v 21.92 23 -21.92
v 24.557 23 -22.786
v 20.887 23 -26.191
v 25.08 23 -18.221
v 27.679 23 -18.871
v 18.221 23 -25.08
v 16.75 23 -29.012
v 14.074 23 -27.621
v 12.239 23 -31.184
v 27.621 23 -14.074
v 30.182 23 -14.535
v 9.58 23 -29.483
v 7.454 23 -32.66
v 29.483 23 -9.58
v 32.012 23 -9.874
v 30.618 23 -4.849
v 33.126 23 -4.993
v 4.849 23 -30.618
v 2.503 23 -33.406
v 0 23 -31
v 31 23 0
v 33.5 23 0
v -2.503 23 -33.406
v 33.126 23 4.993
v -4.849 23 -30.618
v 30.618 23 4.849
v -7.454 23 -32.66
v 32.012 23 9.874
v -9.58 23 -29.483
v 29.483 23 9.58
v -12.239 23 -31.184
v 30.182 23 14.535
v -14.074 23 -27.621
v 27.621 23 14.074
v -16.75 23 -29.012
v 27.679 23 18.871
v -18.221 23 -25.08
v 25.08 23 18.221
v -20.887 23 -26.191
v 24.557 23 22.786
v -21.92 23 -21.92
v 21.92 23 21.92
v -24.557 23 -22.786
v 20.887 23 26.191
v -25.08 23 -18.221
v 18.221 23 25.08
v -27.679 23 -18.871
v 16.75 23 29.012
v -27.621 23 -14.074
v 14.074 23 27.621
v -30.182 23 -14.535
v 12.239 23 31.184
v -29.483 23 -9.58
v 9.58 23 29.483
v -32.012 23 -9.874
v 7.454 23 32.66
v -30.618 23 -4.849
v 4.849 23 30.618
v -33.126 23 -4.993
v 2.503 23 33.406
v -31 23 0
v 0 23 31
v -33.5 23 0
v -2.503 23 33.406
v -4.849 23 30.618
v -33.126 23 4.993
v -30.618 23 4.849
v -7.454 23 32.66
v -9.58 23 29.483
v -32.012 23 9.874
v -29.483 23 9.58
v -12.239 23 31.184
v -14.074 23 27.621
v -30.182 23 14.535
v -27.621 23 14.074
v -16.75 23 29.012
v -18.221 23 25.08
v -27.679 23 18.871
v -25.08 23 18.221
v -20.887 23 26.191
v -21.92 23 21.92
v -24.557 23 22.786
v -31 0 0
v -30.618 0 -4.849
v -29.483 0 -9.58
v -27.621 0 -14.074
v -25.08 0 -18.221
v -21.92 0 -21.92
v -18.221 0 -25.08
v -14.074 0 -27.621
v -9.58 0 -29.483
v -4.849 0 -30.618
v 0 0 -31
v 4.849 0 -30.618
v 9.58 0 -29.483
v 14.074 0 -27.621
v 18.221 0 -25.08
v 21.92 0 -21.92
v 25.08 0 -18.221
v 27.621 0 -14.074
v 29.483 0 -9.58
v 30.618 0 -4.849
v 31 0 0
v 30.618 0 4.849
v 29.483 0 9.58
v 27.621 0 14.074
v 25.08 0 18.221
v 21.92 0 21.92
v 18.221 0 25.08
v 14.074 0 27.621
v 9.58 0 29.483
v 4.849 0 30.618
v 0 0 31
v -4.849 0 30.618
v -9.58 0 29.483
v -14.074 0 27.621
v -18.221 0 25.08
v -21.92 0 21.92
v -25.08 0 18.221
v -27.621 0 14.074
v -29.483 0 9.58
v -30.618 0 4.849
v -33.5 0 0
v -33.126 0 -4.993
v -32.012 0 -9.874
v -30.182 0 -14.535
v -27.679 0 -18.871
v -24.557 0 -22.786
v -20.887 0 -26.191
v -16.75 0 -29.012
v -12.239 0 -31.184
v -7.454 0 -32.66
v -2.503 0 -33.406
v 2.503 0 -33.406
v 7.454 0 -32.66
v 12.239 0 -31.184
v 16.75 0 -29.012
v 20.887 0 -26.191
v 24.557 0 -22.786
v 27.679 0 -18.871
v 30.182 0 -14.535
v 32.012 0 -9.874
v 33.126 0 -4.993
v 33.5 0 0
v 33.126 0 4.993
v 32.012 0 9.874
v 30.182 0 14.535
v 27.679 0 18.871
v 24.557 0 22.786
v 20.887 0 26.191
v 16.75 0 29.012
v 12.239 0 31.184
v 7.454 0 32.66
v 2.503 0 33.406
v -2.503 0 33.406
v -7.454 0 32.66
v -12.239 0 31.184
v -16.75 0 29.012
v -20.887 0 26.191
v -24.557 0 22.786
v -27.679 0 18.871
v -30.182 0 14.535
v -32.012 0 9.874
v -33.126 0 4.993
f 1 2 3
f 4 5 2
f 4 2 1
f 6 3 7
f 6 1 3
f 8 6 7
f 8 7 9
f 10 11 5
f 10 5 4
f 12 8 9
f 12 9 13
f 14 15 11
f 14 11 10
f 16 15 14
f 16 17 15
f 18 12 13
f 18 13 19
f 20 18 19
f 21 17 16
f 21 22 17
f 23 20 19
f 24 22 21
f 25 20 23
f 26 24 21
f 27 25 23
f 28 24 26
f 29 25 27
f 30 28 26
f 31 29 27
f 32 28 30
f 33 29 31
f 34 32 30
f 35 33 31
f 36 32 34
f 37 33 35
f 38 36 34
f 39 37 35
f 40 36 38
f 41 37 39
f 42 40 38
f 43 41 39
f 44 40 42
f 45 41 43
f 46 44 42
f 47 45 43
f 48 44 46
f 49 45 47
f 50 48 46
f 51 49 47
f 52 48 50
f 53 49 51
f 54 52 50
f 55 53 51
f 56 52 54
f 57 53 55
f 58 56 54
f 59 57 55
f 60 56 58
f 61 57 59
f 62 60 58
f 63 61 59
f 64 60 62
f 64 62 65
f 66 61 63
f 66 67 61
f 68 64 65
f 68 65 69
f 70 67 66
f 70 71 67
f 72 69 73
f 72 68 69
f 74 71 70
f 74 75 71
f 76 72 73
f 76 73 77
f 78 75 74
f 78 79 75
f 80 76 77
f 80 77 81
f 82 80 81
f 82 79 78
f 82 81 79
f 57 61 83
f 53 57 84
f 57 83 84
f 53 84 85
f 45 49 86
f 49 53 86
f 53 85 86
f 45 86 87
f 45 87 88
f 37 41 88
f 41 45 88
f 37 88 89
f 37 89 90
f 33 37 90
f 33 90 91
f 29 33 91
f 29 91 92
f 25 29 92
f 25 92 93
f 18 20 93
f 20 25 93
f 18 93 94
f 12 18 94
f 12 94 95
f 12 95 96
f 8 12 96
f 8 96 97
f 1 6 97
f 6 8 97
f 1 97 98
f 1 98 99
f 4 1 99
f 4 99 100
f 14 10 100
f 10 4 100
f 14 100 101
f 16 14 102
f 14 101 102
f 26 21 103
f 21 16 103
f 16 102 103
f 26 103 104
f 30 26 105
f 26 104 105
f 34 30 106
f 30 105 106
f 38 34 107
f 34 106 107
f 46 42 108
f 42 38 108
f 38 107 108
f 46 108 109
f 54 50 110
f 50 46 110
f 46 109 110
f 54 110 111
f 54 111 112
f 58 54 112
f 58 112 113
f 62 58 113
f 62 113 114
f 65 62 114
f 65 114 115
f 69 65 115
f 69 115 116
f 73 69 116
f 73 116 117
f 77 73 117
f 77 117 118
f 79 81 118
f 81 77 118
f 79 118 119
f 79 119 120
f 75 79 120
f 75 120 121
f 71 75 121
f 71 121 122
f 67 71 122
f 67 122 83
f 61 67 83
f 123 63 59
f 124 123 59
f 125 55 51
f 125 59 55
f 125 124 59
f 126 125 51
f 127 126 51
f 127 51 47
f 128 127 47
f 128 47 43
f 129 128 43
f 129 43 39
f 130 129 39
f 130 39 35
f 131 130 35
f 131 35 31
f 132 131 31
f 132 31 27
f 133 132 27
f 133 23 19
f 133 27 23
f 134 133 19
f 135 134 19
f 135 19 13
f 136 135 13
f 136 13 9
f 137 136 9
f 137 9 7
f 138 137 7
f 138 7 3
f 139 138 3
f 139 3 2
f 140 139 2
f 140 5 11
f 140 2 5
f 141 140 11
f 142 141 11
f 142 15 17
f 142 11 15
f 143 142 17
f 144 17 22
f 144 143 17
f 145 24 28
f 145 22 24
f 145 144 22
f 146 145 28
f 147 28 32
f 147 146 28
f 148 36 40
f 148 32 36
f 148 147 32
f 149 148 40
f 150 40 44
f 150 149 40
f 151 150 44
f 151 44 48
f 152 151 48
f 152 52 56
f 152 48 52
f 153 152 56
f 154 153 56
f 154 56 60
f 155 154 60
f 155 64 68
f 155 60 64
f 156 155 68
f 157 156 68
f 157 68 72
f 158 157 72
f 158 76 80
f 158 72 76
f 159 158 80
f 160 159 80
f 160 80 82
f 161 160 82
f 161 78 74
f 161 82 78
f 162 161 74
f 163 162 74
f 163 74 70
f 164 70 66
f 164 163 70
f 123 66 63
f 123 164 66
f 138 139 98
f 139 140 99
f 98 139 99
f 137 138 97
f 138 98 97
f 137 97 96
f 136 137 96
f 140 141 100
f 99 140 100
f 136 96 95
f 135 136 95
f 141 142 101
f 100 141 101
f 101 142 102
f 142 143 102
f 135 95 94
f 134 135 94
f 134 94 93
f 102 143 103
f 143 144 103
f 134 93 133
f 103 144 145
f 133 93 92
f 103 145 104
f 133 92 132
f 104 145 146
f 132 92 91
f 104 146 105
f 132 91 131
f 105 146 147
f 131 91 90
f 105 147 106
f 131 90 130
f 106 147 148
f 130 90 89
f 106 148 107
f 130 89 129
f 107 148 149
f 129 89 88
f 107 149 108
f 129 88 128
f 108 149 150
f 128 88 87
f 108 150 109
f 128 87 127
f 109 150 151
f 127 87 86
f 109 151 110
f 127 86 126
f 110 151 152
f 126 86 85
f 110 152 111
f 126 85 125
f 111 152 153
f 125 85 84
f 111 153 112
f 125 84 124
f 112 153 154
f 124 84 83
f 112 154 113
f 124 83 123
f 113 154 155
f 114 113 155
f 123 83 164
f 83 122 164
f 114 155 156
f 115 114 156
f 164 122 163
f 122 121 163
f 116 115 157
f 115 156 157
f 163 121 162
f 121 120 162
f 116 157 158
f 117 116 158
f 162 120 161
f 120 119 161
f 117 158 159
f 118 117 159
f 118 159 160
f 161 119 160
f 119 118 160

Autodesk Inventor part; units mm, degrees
ref_plane "YZ Plane" through (0, 0, 0) normal (1, 0, 0) x (0, 1, 0)
ref_plane "XZ Plane" through (0, 0, 0) normal (0, 1, 0) x (-1, 0, 0)
ref_plane "XY Plane" through (0, 0, 0) normal (0, 0, 1) x (1, 0, 0)
sketch "Sketch1" plane through (0, 0, 0) normal (0, 1, 0) x (-1, 0, 0)
  circle A0 centre (0, 0) radius 31
  circle A1 centre (0, 0) radius 33.5
  dimension "d0" = 62
  dimension "d1" = 67
extrude "Extrusion1" add sketch "Sketch1" along normal blind 23
sketch "Sketch3" plane through (0, 23, 0) normal (0, 1, 0) x (1, 0, 0)
  circle A0 centre (0, 0) radius 31
hole "Hole1" at (0, 23, 0) direction (0, -1, 0) diameter 62 end through all
sketch "Sketch4" plane through (0, 23, 0) normal (0, 1, 0) x (1, 0, 0)
  circle A0 centre (0, 0) radius 9.4443
hole "Hole2" at (0, 23, 0) direction (0, -1, 0) diameter 62 end through all
properties part number "rueda de rolinera"
